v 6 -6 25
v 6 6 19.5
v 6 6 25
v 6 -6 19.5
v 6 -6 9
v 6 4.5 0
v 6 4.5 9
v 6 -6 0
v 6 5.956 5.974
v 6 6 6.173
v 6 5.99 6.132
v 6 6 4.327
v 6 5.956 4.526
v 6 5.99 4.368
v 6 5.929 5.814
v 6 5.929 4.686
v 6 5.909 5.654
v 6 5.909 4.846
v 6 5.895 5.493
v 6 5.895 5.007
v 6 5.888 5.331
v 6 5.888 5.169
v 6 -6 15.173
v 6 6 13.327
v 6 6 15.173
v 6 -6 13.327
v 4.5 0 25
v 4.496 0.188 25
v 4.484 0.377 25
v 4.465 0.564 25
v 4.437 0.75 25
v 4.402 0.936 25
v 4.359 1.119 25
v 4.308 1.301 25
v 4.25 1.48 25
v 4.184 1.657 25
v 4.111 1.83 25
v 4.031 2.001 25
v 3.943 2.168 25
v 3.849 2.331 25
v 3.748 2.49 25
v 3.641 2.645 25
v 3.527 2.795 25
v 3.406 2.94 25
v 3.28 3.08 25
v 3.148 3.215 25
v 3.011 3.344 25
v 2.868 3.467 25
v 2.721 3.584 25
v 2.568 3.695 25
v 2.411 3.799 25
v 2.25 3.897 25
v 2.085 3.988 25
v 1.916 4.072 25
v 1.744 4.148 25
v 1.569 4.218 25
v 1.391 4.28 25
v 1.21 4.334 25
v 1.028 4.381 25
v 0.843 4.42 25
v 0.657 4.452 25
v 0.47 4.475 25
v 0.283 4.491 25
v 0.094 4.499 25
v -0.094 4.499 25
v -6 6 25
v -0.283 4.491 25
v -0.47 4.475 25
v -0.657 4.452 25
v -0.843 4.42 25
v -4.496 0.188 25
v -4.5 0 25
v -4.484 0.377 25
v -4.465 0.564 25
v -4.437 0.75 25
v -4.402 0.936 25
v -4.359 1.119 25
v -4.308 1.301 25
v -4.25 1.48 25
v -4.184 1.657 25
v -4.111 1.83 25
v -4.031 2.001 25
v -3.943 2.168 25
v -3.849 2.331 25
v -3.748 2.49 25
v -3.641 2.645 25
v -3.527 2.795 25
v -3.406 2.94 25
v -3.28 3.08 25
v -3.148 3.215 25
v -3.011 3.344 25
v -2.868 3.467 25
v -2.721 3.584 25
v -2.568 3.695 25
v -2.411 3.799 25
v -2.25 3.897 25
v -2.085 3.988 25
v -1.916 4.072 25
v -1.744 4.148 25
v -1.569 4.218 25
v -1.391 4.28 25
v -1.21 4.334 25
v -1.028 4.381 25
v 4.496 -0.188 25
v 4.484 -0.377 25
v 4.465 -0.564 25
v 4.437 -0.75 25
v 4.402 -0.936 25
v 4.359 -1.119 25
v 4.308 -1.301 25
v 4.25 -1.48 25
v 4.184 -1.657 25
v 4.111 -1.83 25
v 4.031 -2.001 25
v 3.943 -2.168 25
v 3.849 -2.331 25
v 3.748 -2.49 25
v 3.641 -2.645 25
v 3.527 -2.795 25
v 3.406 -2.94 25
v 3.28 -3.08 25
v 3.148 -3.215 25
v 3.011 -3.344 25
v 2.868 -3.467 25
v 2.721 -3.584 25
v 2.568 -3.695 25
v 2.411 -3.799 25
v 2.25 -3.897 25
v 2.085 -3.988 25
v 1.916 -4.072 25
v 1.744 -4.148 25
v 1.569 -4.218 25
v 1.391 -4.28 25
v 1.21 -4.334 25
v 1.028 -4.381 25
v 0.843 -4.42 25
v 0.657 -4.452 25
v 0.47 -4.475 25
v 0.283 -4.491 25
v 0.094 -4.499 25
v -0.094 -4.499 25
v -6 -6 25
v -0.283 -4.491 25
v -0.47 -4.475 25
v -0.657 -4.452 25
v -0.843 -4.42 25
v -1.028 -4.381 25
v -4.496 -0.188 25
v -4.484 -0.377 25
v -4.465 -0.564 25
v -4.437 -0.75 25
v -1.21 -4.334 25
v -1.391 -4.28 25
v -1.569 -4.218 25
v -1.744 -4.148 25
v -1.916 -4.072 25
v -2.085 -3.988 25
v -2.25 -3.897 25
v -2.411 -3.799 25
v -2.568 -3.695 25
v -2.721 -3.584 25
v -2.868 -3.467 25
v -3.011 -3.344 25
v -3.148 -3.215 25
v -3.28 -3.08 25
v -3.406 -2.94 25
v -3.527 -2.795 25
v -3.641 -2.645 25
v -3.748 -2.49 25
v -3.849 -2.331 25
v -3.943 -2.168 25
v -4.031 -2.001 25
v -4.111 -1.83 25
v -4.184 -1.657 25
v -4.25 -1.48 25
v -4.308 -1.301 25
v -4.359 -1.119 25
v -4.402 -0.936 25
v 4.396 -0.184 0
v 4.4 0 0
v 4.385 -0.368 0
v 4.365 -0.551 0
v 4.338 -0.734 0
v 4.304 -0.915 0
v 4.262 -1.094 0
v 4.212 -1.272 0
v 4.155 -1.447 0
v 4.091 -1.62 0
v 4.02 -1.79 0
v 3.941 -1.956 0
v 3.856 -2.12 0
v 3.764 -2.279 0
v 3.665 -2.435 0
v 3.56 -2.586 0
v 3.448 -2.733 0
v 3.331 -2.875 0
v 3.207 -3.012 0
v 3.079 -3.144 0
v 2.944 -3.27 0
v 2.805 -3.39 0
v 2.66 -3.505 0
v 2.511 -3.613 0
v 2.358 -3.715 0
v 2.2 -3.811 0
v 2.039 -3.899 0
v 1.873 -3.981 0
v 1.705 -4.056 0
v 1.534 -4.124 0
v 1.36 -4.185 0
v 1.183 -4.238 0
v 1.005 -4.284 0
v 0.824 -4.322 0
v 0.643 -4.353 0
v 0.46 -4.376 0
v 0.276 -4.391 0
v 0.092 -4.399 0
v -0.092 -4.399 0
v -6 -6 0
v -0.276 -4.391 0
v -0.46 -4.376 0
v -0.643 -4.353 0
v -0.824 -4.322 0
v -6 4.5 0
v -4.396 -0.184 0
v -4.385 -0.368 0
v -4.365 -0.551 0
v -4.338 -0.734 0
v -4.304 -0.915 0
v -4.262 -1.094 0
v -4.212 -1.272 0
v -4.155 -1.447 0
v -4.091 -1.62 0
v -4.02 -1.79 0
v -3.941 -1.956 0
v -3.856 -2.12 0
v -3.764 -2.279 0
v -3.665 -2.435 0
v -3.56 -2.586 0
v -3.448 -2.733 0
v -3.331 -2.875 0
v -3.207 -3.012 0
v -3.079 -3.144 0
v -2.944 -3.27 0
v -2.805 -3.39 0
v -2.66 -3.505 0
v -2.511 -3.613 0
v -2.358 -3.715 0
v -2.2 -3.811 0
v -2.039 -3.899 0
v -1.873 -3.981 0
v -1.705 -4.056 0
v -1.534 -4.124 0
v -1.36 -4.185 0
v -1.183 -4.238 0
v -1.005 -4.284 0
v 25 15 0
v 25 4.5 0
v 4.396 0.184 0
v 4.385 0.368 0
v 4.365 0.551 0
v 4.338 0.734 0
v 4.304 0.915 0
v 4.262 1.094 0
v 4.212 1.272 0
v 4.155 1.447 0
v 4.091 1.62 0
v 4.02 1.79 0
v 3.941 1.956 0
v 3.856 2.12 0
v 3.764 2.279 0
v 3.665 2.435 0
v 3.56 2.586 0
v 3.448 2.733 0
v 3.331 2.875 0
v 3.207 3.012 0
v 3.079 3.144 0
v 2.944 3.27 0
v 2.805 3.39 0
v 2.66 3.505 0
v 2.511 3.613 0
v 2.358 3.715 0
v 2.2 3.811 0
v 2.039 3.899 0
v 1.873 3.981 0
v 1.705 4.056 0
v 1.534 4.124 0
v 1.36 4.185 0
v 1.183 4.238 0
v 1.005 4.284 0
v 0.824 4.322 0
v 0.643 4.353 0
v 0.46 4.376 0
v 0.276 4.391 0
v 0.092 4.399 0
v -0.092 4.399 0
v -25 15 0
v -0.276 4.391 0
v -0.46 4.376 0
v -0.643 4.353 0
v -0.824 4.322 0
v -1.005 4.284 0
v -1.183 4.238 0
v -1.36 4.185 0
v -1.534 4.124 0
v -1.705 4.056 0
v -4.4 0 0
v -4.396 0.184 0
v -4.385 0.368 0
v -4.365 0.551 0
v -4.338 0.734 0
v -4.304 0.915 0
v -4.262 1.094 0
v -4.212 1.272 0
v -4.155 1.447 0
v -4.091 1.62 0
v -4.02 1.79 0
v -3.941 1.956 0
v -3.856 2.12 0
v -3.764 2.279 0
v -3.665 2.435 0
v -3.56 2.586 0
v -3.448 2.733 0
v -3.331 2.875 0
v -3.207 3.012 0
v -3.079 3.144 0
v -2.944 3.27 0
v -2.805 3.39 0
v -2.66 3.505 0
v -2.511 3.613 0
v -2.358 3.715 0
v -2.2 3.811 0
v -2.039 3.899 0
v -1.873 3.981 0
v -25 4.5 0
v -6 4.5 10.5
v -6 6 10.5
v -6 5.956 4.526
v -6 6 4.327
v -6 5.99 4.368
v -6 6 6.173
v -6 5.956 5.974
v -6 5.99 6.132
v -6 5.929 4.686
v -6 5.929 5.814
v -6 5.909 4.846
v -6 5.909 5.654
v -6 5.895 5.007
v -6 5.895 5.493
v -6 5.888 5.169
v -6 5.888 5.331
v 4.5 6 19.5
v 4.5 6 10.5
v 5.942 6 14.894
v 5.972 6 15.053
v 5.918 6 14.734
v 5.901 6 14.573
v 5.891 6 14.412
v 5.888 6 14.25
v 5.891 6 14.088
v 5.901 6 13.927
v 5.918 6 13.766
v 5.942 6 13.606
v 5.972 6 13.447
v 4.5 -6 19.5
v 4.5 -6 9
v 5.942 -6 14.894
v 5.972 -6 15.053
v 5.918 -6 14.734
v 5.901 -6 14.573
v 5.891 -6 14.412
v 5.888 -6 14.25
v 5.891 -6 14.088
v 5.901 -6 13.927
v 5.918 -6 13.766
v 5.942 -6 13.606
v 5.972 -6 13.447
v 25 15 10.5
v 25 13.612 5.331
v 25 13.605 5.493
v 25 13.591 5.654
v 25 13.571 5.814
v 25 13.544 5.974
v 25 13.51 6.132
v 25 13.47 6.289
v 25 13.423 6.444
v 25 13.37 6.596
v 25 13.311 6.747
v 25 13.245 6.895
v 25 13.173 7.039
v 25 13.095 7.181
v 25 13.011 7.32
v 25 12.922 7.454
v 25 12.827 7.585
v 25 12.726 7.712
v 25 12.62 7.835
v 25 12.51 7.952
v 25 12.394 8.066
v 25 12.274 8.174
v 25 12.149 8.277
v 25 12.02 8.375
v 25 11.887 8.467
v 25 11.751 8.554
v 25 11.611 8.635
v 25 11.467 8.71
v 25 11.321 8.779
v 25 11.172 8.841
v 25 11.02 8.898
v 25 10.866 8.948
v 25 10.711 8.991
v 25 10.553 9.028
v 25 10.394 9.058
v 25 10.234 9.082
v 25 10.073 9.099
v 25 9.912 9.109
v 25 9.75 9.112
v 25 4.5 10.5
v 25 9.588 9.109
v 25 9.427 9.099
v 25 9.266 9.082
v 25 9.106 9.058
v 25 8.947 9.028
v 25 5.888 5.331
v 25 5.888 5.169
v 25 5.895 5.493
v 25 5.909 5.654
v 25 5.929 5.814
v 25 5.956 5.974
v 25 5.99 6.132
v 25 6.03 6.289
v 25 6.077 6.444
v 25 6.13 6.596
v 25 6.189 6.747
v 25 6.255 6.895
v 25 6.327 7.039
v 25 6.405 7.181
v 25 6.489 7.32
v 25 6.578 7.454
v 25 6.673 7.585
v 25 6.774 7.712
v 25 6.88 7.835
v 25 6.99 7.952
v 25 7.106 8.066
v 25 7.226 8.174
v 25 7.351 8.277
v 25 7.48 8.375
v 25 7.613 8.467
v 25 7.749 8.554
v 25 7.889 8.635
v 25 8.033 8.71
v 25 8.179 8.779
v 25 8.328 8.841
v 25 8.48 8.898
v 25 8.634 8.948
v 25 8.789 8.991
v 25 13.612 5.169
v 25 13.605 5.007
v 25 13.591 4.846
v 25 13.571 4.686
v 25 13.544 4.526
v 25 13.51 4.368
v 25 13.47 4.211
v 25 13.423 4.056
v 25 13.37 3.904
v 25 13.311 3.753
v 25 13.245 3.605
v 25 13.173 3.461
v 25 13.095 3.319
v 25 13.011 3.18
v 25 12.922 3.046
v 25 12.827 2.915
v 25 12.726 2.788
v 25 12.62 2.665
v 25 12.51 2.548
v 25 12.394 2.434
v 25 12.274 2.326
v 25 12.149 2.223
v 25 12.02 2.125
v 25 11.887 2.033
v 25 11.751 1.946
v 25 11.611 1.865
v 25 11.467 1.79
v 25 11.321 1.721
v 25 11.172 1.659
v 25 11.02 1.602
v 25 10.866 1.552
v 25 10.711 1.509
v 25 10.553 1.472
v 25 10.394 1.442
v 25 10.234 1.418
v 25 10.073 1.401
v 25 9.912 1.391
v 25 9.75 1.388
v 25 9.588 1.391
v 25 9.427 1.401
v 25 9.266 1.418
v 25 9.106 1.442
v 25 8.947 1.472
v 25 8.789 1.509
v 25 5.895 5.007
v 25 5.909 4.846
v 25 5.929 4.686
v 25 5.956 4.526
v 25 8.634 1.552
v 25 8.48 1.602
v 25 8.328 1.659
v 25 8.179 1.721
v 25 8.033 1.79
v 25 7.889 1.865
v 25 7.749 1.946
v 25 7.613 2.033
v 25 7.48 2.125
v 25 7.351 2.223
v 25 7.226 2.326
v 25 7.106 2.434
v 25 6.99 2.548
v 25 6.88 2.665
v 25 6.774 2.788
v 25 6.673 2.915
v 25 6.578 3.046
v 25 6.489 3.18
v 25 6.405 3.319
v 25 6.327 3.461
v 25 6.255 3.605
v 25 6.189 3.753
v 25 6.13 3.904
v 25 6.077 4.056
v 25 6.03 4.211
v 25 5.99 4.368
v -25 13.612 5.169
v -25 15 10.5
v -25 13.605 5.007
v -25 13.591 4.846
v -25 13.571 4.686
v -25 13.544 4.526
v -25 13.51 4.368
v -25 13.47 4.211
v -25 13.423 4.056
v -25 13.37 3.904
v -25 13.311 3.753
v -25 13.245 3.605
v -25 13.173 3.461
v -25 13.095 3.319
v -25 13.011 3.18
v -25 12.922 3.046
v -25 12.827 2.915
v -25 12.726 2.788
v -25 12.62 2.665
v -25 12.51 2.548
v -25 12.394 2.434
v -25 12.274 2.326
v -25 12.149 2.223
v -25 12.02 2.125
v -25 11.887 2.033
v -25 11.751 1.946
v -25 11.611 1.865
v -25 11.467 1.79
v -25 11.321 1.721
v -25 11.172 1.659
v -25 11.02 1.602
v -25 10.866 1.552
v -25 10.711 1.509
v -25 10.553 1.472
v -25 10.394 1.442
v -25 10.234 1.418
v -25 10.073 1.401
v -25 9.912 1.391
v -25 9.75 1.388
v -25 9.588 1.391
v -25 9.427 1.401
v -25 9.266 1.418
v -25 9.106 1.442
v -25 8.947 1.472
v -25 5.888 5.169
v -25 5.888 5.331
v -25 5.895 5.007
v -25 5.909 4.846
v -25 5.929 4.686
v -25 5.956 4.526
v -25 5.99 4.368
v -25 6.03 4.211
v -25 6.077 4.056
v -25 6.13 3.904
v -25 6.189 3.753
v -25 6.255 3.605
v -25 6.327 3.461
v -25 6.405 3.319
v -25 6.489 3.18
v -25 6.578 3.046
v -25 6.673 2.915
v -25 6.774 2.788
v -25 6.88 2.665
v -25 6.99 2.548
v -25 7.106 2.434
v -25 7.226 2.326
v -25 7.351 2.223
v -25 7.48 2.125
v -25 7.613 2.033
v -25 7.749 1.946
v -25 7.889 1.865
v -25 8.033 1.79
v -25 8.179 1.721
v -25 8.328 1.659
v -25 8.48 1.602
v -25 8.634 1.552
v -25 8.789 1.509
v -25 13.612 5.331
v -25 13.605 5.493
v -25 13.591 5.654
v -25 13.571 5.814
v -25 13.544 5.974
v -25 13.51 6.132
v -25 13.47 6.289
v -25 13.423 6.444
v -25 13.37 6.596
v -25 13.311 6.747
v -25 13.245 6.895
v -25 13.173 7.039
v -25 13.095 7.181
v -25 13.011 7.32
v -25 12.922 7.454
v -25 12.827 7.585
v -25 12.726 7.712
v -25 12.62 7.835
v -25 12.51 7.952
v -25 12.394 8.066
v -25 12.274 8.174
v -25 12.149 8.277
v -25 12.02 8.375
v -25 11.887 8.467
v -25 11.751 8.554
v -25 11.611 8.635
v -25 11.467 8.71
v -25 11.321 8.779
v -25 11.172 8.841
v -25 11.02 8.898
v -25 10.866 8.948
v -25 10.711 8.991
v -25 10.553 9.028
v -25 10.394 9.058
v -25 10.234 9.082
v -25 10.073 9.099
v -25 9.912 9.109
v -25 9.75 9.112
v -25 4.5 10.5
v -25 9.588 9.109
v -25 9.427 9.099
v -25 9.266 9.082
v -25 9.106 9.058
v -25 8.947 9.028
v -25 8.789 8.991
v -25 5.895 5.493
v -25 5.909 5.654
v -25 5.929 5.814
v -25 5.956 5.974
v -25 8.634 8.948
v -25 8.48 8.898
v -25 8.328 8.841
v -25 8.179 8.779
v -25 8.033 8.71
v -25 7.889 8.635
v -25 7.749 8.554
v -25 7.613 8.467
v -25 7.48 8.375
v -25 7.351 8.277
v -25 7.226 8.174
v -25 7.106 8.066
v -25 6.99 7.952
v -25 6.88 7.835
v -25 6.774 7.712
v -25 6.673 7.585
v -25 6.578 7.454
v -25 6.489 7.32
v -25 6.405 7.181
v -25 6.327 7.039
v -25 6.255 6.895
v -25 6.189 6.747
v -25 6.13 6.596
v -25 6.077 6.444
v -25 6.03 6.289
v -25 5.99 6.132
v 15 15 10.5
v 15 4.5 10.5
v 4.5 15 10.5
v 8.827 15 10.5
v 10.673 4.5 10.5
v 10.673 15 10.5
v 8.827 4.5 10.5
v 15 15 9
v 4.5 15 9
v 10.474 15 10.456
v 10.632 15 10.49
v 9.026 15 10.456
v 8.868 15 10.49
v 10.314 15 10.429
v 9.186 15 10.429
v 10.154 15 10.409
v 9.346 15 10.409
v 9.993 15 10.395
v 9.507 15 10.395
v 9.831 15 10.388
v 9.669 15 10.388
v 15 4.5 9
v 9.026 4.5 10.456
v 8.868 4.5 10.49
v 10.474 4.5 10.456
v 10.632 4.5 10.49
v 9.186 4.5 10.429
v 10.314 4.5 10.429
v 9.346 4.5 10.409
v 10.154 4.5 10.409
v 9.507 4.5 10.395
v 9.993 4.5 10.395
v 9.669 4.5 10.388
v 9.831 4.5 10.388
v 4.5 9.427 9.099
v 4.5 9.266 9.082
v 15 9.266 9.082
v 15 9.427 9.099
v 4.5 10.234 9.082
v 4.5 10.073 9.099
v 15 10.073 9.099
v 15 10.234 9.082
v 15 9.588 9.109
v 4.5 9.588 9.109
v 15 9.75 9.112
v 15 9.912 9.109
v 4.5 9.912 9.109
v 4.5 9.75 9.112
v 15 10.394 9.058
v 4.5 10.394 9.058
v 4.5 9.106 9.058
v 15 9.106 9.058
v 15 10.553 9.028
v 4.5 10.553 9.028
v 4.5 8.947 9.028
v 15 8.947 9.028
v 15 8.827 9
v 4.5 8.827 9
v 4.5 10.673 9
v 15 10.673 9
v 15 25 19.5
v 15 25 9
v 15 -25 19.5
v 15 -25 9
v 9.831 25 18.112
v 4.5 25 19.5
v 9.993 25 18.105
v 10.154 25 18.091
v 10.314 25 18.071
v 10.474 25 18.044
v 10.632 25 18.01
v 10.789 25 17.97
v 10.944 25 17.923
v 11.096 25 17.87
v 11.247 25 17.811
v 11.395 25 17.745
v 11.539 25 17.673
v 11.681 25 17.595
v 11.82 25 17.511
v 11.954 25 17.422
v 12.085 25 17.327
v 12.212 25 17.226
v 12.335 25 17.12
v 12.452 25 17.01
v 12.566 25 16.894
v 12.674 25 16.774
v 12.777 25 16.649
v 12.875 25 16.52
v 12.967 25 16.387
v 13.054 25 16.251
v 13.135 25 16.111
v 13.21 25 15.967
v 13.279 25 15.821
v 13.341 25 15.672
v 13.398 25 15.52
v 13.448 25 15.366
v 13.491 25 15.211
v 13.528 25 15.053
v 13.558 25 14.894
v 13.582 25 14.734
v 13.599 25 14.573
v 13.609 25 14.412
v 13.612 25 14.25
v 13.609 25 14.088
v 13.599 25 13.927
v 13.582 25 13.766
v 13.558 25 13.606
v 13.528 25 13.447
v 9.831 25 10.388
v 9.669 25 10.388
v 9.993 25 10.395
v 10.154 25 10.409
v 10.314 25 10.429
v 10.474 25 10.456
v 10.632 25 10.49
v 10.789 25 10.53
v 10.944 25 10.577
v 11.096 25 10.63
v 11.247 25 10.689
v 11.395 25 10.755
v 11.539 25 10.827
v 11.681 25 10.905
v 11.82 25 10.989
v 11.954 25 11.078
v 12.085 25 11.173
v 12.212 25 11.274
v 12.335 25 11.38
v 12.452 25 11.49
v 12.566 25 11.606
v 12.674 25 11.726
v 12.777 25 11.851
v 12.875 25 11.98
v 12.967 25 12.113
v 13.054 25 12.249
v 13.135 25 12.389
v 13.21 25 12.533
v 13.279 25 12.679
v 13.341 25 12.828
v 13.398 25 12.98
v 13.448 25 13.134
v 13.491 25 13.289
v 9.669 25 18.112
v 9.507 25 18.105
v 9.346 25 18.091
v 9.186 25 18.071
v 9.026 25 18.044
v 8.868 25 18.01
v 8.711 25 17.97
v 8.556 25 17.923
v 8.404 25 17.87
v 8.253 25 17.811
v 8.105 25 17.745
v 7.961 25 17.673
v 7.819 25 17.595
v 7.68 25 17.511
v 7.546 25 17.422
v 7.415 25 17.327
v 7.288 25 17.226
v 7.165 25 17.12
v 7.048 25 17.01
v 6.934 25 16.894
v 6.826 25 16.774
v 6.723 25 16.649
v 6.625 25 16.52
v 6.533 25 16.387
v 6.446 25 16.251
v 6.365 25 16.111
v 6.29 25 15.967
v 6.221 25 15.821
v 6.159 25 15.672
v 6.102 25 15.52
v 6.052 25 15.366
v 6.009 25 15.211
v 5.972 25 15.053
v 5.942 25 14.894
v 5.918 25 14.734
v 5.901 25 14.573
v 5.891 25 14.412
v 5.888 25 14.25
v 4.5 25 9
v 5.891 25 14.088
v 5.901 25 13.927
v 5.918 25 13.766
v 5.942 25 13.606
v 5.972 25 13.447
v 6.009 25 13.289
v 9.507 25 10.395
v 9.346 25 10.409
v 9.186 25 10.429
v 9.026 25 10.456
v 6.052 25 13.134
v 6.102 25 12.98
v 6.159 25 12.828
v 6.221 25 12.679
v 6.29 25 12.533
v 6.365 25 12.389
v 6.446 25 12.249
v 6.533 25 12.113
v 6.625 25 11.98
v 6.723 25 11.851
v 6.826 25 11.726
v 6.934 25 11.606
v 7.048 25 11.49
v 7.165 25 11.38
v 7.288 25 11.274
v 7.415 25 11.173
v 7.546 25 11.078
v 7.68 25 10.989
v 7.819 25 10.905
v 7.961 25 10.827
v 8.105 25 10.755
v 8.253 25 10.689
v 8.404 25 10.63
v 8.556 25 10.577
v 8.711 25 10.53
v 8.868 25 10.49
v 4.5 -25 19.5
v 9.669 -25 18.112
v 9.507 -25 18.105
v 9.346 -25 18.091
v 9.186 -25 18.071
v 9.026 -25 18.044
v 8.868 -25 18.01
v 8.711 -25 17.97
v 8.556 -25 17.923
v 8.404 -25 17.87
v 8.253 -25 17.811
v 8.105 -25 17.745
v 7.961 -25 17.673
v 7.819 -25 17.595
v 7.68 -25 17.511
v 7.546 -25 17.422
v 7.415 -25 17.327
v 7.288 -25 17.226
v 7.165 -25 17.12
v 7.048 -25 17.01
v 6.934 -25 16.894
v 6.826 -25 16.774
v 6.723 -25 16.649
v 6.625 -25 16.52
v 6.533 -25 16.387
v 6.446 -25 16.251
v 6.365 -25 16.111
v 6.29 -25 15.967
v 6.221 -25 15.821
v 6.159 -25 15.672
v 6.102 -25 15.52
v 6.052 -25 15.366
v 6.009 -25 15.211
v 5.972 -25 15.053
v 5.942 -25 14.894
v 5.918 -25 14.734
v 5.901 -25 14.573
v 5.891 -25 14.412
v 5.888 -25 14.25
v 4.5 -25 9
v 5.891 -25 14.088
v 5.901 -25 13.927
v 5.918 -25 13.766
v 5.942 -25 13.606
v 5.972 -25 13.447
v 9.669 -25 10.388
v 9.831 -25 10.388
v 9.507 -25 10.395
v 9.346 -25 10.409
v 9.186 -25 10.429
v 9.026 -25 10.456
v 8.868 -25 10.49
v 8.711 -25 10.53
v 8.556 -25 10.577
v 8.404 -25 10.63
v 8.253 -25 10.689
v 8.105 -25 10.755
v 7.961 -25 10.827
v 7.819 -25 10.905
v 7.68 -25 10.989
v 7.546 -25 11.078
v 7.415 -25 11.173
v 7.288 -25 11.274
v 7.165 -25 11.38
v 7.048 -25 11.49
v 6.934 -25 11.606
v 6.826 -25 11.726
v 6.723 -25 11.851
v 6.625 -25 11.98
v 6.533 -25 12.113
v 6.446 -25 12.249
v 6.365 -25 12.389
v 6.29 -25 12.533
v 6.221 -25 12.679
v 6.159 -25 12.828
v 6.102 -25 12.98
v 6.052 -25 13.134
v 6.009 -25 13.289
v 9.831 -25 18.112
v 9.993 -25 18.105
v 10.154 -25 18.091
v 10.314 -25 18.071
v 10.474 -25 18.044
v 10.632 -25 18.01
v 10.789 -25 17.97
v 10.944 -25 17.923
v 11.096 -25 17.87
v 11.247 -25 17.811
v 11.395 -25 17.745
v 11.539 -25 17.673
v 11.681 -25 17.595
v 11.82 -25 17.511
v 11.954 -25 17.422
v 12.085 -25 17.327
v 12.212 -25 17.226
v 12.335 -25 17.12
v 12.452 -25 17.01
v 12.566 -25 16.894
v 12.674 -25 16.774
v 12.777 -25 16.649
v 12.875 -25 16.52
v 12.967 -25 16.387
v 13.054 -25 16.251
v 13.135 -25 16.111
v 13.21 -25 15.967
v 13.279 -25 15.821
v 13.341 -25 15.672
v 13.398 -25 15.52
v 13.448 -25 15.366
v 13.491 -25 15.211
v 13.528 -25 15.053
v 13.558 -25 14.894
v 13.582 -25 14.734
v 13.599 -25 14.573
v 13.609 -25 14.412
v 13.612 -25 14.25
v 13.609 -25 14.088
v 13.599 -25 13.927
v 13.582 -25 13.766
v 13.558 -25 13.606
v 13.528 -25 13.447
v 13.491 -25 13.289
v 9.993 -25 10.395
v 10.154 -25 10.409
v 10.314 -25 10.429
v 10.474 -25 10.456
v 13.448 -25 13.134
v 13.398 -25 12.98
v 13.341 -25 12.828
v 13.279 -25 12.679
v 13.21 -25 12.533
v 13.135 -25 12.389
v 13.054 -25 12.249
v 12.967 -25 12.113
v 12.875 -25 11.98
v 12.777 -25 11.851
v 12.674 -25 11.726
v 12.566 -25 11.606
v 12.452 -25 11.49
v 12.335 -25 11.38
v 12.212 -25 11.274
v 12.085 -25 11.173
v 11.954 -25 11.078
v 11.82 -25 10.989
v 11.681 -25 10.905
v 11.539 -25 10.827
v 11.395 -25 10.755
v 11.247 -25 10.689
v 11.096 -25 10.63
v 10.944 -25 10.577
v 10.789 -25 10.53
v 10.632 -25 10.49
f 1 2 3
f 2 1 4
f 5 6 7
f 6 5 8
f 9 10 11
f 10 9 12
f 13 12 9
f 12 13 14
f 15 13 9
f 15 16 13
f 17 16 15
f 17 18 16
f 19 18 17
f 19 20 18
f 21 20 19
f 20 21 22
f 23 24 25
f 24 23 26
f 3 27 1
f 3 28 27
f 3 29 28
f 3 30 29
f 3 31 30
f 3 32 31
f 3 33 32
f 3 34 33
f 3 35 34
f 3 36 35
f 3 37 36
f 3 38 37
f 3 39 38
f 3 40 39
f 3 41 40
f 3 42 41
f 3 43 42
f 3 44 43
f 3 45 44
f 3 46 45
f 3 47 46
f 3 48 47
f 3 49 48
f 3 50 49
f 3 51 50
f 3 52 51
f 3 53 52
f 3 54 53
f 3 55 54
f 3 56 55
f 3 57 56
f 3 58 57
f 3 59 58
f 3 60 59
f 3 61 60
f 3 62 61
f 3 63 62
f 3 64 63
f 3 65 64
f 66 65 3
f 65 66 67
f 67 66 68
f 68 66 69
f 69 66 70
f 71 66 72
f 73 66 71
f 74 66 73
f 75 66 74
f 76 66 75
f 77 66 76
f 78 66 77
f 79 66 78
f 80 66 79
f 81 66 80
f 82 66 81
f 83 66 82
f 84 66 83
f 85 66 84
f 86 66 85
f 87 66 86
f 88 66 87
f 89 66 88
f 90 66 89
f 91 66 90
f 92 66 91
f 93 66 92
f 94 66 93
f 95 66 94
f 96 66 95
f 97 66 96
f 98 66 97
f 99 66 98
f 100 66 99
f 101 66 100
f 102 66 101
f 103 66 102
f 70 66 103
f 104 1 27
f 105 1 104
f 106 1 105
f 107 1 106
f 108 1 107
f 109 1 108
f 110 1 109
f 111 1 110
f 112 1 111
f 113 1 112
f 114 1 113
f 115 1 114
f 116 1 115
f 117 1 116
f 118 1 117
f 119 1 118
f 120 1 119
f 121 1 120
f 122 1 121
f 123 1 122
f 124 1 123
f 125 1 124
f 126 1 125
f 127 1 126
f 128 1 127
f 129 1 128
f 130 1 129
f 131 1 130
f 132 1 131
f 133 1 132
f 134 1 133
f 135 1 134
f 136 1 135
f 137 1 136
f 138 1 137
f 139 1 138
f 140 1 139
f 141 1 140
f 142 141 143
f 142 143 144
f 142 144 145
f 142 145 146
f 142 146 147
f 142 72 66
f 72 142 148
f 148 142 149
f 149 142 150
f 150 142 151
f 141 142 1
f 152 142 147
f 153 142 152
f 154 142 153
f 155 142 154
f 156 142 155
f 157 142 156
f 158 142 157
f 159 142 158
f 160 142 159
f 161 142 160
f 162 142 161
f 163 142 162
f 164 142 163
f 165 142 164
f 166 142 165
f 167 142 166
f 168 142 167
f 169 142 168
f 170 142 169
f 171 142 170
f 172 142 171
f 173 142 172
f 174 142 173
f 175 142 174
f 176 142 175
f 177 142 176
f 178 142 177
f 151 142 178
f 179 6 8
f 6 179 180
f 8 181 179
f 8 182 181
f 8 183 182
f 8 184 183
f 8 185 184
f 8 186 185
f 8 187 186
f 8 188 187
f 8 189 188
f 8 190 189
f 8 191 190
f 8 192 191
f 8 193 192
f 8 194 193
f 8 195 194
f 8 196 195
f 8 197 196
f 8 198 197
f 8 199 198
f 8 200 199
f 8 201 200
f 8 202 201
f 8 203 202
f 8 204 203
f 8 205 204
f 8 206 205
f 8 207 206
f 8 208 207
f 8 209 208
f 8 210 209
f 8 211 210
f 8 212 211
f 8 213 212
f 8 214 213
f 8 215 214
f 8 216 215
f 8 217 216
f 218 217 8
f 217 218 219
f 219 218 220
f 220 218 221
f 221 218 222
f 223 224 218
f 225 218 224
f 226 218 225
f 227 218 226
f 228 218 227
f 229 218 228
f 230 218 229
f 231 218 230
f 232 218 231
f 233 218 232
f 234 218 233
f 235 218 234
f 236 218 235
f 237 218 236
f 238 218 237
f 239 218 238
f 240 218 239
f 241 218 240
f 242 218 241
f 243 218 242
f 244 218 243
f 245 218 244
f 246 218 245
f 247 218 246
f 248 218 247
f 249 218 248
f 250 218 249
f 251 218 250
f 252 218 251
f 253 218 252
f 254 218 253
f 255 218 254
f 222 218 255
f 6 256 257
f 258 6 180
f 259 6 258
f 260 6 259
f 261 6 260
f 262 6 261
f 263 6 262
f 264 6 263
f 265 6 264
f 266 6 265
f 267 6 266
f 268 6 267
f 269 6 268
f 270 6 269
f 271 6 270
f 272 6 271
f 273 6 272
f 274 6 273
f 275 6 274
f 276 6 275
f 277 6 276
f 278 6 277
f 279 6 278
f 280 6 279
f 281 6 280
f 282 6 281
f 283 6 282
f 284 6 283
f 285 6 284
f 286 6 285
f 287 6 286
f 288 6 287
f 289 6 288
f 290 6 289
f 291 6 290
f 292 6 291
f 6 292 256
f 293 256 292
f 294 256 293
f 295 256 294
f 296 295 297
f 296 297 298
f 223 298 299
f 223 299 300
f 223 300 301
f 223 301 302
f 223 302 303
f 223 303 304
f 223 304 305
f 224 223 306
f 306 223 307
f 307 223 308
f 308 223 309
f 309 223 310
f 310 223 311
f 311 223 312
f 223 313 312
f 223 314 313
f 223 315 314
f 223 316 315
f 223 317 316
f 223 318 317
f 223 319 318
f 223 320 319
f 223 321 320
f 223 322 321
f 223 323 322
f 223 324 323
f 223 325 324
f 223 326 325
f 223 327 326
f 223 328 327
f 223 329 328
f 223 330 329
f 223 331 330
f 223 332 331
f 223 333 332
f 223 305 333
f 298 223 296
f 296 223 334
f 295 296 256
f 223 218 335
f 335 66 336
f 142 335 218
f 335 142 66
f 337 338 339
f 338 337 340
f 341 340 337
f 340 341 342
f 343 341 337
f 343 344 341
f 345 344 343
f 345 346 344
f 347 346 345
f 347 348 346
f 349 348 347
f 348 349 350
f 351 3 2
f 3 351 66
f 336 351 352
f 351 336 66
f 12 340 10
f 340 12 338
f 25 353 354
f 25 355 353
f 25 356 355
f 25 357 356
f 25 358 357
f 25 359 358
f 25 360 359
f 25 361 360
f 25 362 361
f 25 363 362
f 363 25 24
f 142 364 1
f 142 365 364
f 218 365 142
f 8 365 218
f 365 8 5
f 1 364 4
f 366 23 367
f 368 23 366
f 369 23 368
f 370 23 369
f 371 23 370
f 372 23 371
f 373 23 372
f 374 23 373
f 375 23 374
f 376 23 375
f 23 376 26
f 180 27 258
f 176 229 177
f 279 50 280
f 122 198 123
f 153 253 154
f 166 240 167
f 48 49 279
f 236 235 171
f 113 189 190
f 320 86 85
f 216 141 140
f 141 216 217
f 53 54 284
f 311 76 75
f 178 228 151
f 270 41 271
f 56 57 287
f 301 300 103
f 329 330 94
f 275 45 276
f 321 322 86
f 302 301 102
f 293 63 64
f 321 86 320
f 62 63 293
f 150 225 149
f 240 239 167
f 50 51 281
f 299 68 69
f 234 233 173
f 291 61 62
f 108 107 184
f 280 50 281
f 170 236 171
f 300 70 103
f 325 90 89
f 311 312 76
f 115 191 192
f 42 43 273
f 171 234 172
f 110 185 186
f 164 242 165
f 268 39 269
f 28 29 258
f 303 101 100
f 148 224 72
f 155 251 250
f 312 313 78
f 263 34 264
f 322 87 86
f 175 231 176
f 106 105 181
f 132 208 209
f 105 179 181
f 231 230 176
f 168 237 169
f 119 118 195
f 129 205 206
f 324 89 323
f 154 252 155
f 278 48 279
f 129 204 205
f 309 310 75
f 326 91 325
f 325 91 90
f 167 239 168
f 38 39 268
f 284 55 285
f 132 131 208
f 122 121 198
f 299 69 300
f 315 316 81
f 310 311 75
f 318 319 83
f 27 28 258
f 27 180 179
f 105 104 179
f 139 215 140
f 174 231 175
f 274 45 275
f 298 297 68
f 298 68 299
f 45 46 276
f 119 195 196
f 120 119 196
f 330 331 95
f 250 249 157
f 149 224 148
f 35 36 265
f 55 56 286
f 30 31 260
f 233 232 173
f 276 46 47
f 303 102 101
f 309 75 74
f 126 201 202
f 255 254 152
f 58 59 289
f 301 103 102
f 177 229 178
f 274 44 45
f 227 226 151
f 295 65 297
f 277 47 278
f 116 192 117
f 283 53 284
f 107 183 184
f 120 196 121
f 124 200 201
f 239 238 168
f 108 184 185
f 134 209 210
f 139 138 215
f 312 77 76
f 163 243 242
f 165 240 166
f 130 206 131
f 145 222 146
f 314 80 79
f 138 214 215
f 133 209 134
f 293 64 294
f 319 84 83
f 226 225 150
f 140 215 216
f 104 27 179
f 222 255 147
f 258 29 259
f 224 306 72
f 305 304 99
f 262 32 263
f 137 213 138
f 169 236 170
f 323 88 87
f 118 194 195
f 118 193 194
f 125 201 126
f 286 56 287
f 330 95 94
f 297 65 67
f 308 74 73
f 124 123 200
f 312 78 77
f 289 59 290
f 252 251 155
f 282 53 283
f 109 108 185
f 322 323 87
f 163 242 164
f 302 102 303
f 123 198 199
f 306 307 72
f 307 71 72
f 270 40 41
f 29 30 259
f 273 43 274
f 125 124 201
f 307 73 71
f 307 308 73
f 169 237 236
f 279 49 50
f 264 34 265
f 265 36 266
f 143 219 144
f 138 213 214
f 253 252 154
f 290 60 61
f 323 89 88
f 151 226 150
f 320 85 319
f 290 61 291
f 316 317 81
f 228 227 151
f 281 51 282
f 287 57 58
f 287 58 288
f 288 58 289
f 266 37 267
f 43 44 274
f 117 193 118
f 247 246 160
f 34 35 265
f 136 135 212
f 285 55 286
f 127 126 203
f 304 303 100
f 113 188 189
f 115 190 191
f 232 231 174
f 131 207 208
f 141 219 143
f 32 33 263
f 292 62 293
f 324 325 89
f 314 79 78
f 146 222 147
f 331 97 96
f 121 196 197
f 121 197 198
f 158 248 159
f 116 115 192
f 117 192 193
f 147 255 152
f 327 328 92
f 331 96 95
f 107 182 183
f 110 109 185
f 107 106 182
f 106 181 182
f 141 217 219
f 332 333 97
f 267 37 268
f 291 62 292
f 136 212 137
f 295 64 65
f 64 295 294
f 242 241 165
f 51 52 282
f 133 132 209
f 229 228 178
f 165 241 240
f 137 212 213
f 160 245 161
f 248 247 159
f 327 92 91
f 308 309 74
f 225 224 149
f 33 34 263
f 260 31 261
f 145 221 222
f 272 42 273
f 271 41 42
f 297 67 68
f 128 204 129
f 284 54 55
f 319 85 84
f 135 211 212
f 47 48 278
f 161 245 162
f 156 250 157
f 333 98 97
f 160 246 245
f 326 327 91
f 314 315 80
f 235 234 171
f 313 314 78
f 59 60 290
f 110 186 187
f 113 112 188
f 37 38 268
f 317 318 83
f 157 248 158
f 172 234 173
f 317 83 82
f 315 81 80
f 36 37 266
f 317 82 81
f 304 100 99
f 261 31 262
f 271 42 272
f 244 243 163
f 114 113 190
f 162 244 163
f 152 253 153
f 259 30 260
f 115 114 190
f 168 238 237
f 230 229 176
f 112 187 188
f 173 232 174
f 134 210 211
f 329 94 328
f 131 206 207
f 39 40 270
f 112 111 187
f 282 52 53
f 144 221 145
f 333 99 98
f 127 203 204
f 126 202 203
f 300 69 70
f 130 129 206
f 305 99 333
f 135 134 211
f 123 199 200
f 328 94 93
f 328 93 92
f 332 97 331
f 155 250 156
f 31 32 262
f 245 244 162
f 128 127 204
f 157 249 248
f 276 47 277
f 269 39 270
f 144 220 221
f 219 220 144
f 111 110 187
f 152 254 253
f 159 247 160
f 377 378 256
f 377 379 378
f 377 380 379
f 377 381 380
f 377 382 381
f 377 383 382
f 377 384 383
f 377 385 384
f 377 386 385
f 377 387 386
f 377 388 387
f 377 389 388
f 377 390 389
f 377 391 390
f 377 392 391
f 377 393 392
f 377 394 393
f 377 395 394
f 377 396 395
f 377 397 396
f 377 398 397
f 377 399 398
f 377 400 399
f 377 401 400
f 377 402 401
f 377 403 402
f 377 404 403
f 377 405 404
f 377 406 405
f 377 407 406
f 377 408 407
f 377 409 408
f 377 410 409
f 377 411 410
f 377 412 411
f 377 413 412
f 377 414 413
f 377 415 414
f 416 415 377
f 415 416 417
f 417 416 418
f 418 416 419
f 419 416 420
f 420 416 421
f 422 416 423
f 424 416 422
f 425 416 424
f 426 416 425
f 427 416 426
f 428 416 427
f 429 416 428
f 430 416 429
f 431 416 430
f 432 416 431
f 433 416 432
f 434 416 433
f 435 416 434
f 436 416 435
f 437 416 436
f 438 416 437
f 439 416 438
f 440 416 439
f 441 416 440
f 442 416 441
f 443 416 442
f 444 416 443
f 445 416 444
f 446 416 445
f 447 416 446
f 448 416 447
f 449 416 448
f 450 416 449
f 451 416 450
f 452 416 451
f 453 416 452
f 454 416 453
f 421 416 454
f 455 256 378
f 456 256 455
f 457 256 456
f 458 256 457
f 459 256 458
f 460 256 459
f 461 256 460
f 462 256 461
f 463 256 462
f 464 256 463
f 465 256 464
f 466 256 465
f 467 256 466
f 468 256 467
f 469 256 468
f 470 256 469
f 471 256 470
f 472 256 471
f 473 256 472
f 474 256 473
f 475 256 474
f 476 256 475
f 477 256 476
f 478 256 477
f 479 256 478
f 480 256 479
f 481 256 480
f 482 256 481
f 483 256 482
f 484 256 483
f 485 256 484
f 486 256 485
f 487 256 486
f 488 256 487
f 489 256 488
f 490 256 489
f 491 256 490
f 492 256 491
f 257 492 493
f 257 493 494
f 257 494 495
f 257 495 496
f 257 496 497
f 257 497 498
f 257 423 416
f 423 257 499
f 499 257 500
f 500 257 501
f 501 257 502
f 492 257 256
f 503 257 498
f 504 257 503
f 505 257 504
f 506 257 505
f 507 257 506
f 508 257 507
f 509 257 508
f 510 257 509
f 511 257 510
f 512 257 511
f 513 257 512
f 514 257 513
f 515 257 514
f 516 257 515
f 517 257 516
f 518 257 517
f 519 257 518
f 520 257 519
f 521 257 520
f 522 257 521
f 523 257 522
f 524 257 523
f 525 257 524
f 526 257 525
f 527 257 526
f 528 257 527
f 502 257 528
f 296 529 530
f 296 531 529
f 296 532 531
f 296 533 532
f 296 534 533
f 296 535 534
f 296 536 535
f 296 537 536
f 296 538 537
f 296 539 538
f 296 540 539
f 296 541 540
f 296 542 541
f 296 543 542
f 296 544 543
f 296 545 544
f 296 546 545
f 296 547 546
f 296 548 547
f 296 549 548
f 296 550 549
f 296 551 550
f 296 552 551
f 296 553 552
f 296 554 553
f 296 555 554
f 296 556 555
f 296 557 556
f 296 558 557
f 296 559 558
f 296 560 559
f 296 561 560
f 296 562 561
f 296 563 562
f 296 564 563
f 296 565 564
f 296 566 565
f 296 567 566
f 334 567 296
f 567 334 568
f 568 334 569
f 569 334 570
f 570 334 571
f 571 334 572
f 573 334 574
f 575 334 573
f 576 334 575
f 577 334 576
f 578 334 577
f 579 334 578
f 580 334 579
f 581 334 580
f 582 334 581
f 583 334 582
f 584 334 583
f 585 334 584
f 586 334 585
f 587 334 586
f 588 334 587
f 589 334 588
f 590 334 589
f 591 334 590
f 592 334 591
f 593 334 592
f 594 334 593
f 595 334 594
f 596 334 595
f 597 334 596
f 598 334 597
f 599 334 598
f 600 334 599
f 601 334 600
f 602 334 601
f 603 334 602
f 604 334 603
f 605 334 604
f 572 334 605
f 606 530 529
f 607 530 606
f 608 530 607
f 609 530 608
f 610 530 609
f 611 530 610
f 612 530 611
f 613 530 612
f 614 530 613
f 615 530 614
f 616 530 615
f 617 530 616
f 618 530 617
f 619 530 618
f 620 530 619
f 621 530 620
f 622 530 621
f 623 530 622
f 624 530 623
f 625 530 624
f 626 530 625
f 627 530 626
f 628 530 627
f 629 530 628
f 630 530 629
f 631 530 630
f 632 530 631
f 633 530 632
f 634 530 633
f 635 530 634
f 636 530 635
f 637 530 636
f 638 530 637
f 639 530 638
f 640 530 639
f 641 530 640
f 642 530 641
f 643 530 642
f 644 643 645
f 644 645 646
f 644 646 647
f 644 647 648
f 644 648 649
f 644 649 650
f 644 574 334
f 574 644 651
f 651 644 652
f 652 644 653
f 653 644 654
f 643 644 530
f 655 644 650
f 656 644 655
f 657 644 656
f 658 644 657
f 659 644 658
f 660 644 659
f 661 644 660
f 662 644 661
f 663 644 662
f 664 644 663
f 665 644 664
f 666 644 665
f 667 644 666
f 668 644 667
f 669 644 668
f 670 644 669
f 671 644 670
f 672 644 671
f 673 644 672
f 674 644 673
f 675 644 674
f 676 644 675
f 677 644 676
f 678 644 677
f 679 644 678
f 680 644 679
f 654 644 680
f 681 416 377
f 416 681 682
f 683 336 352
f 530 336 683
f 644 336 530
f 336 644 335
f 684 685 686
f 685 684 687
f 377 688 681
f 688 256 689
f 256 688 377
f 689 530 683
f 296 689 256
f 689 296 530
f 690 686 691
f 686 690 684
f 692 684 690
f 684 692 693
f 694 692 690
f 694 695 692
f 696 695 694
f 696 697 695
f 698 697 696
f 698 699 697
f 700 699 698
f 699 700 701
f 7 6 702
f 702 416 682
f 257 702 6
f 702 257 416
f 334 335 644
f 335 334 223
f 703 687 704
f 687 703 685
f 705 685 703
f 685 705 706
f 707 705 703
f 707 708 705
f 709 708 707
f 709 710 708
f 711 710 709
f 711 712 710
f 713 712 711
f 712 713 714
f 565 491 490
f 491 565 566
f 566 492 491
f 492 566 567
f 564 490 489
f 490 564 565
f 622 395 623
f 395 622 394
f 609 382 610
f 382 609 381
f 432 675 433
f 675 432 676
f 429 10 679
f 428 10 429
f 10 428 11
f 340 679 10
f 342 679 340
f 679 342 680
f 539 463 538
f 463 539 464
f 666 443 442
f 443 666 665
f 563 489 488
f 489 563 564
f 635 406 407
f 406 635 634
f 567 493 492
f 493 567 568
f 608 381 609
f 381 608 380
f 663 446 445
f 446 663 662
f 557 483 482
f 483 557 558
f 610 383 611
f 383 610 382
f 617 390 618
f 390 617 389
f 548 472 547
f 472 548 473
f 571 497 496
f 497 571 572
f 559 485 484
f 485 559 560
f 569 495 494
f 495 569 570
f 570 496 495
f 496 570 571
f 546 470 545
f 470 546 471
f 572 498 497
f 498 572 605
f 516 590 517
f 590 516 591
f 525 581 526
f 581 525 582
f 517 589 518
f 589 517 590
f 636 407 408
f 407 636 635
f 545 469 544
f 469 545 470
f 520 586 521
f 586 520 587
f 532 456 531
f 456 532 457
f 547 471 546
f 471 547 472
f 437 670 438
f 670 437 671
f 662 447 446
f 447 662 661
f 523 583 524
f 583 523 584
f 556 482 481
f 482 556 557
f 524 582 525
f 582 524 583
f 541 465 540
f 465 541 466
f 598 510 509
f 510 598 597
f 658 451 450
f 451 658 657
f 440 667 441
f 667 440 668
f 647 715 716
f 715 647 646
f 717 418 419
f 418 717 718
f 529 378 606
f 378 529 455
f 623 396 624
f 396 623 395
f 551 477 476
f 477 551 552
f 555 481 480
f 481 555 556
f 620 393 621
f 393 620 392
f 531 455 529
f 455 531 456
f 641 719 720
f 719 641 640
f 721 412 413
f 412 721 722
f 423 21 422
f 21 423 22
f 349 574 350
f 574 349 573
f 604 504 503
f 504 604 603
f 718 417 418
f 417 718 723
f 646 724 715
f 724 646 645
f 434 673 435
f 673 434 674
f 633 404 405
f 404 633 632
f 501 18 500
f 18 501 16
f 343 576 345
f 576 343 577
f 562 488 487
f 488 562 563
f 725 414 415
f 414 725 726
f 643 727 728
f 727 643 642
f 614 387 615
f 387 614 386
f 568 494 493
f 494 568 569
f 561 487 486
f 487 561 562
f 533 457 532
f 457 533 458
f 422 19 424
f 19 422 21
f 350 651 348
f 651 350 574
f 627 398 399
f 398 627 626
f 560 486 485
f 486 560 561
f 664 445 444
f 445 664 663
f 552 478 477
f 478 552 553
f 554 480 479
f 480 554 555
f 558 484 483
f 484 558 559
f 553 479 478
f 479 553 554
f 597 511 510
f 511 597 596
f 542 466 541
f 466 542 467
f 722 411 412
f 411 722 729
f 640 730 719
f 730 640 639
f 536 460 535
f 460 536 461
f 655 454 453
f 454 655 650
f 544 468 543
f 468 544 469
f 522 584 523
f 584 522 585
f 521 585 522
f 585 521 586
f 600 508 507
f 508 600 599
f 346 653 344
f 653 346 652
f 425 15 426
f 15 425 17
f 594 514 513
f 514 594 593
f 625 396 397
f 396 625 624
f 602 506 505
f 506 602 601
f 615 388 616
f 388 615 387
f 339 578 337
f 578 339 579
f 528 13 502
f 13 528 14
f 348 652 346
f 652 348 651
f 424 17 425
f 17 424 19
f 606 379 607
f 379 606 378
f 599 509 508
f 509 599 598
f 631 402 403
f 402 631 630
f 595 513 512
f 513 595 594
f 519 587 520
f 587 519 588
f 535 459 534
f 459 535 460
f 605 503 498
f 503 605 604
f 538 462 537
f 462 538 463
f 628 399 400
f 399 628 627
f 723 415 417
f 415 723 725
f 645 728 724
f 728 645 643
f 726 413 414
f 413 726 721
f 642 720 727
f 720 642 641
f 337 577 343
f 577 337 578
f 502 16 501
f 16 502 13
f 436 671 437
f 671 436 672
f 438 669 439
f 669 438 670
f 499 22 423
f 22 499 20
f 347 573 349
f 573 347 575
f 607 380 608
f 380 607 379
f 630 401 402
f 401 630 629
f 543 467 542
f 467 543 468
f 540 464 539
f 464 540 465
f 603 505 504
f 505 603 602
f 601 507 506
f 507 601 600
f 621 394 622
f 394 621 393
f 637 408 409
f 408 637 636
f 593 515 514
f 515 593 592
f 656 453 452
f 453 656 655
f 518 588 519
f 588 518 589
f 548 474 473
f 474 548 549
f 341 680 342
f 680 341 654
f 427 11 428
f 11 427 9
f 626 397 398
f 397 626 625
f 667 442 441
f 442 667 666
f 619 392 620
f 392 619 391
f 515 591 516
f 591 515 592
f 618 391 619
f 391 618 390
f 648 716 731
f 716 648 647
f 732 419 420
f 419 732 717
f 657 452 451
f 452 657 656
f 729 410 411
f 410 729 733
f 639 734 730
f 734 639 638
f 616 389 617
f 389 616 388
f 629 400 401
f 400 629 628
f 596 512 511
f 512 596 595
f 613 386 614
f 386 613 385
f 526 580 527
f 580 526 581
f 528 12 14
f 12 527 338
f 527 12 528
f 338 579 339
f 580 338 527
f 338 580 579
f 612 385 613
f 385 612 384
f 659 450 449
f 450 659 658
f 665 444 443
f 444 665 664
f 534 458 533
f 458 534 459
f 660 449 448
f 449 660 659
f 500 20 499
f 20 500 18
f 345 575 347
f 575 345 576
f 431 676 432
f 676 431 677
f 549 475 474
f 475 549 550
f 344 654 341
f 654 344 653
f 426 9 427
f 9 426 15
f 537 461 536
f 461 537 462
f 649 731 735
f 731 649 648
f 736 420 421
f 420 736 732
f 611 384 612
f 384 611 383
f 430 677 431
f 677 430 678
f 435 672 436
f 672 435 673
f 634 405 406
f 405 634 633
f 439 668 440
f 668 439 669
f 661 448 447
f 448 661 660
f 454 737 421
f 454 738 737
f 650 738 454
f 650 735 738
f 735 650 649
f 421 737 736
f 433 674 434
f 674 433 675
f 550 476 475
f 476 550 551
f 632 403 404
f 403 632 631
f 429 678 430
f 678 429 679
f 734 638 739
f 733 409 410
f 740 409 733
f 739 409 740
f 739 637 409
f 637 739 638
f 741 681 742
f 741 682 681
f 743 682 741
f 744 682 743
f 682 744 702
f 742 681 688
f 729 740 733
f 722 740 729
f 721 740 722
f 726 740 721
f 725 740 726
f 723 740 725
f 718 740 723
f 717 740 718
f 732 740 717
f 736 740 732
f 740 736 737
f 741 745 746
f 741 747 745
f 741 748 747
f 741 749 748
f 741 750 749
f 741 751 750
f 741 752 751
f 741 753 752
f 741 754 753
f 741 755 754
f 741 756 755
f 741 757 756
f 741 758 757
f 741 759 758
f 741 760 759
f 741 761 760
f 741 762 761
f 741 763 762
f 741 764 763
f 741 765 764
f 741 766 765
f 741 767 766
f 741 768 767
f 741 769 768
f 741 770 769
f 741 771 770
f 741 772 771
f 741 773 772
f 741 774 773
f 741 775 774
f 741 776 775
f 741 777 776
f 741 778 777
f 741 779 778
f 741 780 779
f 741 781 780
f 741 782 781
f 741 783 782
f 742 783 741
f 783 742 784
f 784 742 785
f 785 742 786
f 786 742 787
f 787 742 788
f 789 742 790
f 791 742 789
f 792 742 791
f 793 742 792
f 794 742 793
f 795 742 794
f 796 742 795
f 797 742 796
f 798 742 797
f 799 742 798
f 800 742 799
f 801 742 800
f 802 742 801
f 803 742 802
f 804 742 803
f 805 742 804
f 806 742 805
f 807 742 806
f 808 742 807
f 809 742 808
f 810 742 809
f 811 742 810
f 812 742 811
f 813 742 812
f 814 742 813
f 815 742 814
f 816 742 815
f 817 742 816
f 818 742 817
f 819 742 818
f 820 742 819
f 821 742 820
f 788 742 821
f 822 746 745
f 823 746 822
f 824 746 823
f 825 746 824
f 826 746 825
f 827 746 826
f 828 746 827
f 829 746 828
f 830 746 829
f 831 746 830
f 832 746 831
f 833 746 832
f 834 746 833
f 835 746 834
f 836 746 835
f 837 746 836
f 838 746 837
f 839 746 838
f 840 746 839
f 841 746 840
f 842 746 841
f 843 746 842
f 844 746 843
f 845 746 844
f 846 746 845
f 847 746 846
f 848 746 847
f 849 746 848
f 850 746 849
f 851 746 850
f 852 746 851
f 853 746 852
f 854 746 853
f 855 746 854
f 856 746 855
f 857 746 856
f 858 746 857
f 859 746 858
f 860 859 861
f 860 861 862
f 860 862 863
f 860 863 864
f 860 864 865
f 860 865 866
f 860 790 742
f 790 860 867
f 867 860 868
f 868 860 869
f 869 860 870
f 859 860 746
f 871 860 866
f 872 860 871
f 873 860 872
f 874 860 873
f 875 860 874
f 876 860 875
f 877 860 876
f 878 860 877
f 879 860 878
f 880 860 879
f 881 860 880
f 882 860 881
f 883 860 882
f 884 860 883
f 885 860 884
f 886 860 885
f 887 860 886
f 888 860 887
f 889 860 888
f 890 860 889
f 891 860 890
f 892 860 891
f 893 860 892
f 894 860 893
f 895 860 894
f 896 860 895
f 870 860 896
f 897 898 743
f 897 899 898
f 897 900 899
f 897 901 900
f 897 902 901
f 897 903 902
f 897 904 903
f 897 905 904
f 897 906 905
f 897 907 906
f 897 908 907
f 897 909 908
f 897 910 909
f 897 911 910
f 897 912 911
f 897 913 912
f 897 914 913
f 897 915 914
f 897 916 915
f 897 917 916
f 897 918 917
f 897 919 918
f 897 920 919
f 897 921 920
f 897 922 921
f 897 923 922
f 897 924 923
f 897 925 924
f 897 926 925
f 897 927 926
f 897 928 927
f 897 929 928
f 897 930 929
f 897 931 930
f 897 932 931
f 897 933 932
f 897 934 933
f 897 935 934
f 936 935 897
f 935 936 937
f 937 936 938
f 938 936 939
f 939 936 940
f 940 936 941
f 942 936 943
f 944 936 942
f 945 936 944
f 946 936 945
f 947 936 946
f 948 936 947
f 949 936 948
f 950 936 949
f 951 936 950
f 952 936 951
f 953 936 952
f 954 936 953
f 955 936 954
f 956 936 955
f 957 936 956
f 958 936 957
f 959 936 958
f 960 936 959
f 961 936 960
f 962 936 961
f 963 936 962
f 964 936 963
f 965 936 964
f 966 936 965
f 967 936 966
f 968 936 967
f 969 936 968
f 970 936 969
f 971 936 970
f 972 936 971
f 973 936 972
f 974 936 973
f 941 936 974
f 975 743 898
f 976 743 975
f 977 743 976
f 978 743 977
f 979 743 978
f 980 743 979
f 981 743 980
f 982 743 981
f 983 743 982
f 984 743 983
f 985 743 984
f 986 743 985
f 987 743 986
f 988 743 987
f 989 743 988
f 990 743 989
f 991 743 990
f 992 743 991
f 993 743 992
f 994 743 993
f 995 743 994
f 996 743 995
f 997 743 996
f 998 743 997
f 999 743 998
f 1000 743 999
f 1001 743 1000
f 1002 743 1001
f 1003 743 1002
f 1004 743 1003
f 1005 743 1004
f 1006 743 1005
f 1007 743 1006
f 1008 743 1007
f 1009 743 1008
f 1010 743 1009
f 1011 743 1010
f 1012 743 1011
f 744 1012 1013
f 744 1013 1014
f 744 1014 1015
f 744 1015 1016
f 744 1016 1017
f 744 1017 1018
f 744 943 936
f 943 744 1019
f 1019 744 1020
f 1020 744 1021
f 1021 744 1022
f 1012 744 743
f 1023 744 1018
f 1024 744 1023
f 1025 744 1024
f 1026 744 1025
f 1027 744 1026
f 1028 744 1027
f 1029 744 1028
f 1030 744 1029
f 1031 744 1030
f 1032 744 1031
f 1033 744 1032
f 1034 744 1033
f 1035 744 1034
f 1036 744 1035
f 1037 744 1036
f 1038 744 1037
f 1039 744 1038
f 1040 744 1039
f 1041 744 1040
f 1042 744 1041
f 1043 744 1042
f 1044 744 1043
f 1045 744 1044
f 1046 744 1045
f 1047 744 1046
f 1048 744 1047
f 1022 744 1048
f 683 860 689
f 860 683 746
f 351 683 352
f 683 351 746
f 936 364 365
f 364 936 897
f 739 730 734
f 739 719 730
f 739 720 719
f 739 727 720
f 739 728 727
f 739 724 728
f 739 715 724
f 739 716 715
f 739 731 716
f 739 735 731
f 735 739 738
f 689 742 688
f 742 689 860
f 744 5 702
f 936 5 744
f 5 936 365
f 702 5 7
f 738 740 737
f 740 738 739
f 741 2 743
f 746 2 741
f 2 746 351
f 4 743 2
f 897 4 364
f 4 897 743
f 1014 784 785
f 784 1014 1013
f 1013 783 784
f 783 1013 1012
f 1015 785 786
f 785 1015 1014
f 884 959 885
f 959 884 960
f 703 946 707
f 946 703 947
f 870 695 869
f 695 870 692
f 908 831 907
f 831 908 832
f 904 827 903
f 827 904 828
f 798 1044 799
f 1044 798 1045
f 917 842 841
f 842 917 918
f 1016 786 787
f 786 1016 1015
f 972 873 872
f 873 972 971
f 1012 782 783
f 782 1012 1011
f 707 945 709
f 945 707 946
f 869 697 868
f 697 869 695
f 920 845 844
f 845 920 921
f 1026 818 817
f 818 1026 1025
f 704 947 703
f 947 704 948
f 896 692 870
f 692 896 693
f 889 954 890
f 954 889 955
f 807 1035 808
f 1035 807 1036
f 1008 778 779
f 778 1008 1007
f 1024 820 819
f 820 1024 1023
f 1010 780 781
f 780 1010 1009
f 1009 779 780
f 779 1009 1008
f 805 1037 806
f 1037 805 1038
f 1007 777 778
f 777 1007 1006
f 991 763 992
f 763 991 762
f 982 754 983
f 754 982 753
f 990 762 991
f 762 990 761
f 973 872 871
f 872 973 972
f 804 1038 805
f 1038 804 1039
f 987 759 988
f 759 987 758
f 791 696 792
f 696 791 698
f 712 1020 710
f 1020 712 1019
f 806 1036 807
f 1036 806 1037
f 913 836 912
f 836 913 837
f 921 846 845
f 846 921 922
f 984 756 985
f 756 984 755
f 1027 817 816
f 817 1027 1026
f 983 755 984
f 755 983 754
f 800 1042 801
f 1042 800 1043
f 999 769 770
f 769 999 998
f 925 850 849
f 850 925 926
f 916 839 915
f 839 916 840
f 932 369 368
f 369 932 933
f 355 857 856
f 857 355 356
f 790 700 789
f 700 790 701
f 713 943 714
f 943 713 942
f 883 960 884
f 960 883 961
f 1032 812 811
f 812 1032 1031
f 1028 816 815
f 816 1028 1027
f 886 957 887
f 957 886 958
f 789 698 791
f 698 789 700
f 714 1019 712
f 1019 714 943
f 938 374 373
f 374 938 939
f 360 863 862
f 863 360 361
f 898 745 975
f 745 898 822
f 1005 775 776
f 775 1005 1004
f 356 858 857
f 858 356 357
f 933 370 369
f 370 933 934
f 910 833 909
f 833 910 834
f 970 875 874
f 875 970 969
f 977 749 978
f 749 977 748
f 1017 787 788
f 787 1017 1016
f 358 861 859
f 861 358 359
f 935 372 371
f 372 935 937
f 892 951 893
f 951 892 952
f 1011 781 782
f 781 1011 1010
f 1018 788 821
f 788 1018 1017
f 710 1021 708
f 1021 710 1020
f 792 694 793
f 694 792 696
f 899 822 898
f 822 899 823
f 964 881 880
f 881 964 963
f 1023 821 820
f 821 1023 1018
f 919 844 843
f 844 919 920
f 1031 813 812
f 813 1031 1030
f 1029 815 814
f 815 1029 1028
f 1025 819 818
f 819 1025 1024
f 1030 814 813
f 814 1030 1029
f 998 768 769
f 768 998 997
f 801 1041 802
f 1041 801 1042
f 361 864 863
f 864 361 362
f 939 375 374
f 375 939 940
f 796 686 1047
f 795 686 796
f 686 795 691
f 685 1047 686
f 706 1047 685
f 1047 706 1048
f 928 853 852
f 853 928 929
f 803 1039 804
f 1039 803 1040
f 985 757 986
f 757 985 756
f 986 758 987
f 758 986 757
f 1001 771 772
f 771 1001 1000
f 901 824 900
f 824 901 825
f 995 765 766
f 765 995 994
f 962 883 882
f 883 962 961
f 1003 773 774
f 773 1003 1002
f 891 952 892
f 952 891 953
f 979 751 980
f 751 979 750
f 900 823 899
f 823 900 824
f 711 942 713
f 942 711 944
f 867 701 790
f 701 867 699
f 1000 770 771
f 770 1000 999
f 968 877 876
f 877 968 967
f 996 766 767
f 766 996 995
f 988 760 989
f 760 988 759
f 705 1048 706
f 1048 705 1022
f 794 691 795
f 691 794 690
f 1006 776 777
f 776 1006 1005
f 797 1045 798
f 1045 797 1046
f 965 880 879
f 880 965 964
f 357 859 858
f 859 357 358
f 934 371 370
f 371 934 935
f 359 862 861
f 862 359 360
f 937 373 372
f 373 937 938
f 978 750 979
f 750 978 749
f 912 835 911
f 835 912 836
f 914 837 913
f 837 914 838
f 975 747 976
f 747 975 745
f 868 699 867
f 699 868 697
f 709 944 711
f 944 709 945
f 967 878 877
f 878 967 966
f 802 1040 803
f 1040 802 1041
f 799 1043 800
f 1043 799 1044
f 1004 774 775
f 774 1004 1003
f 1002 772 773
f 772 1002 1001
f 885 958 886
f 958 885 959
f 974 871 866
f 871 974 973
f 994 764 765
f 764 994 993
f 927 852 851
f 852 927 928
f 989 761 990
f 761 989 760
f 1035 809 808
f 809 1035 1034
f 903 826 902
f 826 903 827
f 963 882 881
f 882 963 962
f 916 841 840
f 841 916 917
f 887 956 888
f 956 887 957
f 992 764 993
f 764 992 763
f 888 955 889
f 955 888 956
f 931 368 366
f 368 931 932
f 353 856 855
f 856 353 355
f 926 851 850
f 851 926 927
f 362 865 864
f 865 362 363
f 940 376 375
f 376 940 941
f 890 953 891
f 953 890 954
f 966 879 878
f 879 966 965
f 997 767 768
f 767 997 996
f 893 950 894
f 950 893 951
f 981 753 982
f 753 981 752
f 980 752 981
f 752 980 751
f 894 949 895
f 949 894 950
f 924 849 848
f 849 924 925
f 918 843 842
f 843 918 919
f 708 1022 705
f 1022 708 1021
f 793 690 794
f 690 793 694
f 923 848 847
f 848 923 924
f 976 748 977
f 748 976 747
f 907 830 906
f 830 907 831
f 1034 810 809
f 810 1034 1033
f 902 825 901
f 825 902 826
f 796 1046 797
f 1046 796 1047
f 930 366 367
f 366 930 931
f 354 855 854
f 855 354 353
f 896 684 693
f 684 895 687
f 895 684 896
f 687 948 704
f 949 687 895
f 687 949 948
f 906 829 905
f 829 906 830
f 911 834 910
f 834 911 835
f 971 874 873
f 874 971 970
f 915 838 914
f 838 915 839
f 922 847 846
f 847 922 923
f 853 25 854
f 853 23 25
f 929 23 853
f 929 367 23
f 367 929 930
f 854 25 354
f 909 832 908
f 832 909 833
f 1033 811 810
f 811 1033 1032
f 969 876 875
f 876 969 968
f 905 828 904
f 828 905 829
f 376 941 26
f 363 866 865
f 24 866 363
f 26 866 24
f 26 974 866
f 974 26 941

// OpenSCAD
$fn = ($preview)?25:150;

/*	Hold two rods at right angles rigidly on an antenna mast e.g. as a support for a halo antenna
 *	by KL4LJ 2025-08-03
 */



vert_height = 25;			//height of vertical section that fits around mast
vert_diameters = [8.8, 9];	//to fit snugly on a slightly conical mast (in my case the SOTABeams Tactical Mini)
wall_thickness = 1.5;			//minimum wall thickness around hole
horiz_length = 50;			//length of sections that rods slide into


tol = 1.03;					//tolerances for holes

rod_diameter = 7.5;			//in my case: fiberglass stakes with reflective tape at the top to mark the edges of driveways, etc in snow

horiz_thickness = rod_diameter + 2*wall_thickness;
vert_thickness = /*the thicker end of the conical hole*/ vert_diameters[1] + 2*wall_thickness;

union() {
	translate([0, 0, vert_height/2]) difference() {
		cube([vert_thickness, vert_thickness, vert_height], center=true);
		cylinder(h=vert_height, d1 = vert_diameters[0], d2 = vert_diameters[1], center=true);
	}

	//            v— maximally overlap walls for strength                v— match bottom of vertical to reduce overhangs
	translate([0, vert_thickness/2 + horiz_thickness/2 - wall_thickness, horiz_thickness/2]) rotate([0, 90, 0]) difference() {
		cube([horiz_thickness, horiz_thickness, horiz_length], center = true);
		cylinder(h=horiz_length, d=rod_diameter*tol, center=true);
	}
	
	translate([vert_thickness/2 + horiz_thickness/2 - wall_thickness, 0, 1.5*horiz_thickness - wall_thickness]) rotate([-90, 0, 0]) difference() {
		cube([horiz_thickness, horiz_thickness, horiz_length], center = true);
		cylinder(h=horiz_length, d=rod_diameter*tol, center=true);
	}
}
